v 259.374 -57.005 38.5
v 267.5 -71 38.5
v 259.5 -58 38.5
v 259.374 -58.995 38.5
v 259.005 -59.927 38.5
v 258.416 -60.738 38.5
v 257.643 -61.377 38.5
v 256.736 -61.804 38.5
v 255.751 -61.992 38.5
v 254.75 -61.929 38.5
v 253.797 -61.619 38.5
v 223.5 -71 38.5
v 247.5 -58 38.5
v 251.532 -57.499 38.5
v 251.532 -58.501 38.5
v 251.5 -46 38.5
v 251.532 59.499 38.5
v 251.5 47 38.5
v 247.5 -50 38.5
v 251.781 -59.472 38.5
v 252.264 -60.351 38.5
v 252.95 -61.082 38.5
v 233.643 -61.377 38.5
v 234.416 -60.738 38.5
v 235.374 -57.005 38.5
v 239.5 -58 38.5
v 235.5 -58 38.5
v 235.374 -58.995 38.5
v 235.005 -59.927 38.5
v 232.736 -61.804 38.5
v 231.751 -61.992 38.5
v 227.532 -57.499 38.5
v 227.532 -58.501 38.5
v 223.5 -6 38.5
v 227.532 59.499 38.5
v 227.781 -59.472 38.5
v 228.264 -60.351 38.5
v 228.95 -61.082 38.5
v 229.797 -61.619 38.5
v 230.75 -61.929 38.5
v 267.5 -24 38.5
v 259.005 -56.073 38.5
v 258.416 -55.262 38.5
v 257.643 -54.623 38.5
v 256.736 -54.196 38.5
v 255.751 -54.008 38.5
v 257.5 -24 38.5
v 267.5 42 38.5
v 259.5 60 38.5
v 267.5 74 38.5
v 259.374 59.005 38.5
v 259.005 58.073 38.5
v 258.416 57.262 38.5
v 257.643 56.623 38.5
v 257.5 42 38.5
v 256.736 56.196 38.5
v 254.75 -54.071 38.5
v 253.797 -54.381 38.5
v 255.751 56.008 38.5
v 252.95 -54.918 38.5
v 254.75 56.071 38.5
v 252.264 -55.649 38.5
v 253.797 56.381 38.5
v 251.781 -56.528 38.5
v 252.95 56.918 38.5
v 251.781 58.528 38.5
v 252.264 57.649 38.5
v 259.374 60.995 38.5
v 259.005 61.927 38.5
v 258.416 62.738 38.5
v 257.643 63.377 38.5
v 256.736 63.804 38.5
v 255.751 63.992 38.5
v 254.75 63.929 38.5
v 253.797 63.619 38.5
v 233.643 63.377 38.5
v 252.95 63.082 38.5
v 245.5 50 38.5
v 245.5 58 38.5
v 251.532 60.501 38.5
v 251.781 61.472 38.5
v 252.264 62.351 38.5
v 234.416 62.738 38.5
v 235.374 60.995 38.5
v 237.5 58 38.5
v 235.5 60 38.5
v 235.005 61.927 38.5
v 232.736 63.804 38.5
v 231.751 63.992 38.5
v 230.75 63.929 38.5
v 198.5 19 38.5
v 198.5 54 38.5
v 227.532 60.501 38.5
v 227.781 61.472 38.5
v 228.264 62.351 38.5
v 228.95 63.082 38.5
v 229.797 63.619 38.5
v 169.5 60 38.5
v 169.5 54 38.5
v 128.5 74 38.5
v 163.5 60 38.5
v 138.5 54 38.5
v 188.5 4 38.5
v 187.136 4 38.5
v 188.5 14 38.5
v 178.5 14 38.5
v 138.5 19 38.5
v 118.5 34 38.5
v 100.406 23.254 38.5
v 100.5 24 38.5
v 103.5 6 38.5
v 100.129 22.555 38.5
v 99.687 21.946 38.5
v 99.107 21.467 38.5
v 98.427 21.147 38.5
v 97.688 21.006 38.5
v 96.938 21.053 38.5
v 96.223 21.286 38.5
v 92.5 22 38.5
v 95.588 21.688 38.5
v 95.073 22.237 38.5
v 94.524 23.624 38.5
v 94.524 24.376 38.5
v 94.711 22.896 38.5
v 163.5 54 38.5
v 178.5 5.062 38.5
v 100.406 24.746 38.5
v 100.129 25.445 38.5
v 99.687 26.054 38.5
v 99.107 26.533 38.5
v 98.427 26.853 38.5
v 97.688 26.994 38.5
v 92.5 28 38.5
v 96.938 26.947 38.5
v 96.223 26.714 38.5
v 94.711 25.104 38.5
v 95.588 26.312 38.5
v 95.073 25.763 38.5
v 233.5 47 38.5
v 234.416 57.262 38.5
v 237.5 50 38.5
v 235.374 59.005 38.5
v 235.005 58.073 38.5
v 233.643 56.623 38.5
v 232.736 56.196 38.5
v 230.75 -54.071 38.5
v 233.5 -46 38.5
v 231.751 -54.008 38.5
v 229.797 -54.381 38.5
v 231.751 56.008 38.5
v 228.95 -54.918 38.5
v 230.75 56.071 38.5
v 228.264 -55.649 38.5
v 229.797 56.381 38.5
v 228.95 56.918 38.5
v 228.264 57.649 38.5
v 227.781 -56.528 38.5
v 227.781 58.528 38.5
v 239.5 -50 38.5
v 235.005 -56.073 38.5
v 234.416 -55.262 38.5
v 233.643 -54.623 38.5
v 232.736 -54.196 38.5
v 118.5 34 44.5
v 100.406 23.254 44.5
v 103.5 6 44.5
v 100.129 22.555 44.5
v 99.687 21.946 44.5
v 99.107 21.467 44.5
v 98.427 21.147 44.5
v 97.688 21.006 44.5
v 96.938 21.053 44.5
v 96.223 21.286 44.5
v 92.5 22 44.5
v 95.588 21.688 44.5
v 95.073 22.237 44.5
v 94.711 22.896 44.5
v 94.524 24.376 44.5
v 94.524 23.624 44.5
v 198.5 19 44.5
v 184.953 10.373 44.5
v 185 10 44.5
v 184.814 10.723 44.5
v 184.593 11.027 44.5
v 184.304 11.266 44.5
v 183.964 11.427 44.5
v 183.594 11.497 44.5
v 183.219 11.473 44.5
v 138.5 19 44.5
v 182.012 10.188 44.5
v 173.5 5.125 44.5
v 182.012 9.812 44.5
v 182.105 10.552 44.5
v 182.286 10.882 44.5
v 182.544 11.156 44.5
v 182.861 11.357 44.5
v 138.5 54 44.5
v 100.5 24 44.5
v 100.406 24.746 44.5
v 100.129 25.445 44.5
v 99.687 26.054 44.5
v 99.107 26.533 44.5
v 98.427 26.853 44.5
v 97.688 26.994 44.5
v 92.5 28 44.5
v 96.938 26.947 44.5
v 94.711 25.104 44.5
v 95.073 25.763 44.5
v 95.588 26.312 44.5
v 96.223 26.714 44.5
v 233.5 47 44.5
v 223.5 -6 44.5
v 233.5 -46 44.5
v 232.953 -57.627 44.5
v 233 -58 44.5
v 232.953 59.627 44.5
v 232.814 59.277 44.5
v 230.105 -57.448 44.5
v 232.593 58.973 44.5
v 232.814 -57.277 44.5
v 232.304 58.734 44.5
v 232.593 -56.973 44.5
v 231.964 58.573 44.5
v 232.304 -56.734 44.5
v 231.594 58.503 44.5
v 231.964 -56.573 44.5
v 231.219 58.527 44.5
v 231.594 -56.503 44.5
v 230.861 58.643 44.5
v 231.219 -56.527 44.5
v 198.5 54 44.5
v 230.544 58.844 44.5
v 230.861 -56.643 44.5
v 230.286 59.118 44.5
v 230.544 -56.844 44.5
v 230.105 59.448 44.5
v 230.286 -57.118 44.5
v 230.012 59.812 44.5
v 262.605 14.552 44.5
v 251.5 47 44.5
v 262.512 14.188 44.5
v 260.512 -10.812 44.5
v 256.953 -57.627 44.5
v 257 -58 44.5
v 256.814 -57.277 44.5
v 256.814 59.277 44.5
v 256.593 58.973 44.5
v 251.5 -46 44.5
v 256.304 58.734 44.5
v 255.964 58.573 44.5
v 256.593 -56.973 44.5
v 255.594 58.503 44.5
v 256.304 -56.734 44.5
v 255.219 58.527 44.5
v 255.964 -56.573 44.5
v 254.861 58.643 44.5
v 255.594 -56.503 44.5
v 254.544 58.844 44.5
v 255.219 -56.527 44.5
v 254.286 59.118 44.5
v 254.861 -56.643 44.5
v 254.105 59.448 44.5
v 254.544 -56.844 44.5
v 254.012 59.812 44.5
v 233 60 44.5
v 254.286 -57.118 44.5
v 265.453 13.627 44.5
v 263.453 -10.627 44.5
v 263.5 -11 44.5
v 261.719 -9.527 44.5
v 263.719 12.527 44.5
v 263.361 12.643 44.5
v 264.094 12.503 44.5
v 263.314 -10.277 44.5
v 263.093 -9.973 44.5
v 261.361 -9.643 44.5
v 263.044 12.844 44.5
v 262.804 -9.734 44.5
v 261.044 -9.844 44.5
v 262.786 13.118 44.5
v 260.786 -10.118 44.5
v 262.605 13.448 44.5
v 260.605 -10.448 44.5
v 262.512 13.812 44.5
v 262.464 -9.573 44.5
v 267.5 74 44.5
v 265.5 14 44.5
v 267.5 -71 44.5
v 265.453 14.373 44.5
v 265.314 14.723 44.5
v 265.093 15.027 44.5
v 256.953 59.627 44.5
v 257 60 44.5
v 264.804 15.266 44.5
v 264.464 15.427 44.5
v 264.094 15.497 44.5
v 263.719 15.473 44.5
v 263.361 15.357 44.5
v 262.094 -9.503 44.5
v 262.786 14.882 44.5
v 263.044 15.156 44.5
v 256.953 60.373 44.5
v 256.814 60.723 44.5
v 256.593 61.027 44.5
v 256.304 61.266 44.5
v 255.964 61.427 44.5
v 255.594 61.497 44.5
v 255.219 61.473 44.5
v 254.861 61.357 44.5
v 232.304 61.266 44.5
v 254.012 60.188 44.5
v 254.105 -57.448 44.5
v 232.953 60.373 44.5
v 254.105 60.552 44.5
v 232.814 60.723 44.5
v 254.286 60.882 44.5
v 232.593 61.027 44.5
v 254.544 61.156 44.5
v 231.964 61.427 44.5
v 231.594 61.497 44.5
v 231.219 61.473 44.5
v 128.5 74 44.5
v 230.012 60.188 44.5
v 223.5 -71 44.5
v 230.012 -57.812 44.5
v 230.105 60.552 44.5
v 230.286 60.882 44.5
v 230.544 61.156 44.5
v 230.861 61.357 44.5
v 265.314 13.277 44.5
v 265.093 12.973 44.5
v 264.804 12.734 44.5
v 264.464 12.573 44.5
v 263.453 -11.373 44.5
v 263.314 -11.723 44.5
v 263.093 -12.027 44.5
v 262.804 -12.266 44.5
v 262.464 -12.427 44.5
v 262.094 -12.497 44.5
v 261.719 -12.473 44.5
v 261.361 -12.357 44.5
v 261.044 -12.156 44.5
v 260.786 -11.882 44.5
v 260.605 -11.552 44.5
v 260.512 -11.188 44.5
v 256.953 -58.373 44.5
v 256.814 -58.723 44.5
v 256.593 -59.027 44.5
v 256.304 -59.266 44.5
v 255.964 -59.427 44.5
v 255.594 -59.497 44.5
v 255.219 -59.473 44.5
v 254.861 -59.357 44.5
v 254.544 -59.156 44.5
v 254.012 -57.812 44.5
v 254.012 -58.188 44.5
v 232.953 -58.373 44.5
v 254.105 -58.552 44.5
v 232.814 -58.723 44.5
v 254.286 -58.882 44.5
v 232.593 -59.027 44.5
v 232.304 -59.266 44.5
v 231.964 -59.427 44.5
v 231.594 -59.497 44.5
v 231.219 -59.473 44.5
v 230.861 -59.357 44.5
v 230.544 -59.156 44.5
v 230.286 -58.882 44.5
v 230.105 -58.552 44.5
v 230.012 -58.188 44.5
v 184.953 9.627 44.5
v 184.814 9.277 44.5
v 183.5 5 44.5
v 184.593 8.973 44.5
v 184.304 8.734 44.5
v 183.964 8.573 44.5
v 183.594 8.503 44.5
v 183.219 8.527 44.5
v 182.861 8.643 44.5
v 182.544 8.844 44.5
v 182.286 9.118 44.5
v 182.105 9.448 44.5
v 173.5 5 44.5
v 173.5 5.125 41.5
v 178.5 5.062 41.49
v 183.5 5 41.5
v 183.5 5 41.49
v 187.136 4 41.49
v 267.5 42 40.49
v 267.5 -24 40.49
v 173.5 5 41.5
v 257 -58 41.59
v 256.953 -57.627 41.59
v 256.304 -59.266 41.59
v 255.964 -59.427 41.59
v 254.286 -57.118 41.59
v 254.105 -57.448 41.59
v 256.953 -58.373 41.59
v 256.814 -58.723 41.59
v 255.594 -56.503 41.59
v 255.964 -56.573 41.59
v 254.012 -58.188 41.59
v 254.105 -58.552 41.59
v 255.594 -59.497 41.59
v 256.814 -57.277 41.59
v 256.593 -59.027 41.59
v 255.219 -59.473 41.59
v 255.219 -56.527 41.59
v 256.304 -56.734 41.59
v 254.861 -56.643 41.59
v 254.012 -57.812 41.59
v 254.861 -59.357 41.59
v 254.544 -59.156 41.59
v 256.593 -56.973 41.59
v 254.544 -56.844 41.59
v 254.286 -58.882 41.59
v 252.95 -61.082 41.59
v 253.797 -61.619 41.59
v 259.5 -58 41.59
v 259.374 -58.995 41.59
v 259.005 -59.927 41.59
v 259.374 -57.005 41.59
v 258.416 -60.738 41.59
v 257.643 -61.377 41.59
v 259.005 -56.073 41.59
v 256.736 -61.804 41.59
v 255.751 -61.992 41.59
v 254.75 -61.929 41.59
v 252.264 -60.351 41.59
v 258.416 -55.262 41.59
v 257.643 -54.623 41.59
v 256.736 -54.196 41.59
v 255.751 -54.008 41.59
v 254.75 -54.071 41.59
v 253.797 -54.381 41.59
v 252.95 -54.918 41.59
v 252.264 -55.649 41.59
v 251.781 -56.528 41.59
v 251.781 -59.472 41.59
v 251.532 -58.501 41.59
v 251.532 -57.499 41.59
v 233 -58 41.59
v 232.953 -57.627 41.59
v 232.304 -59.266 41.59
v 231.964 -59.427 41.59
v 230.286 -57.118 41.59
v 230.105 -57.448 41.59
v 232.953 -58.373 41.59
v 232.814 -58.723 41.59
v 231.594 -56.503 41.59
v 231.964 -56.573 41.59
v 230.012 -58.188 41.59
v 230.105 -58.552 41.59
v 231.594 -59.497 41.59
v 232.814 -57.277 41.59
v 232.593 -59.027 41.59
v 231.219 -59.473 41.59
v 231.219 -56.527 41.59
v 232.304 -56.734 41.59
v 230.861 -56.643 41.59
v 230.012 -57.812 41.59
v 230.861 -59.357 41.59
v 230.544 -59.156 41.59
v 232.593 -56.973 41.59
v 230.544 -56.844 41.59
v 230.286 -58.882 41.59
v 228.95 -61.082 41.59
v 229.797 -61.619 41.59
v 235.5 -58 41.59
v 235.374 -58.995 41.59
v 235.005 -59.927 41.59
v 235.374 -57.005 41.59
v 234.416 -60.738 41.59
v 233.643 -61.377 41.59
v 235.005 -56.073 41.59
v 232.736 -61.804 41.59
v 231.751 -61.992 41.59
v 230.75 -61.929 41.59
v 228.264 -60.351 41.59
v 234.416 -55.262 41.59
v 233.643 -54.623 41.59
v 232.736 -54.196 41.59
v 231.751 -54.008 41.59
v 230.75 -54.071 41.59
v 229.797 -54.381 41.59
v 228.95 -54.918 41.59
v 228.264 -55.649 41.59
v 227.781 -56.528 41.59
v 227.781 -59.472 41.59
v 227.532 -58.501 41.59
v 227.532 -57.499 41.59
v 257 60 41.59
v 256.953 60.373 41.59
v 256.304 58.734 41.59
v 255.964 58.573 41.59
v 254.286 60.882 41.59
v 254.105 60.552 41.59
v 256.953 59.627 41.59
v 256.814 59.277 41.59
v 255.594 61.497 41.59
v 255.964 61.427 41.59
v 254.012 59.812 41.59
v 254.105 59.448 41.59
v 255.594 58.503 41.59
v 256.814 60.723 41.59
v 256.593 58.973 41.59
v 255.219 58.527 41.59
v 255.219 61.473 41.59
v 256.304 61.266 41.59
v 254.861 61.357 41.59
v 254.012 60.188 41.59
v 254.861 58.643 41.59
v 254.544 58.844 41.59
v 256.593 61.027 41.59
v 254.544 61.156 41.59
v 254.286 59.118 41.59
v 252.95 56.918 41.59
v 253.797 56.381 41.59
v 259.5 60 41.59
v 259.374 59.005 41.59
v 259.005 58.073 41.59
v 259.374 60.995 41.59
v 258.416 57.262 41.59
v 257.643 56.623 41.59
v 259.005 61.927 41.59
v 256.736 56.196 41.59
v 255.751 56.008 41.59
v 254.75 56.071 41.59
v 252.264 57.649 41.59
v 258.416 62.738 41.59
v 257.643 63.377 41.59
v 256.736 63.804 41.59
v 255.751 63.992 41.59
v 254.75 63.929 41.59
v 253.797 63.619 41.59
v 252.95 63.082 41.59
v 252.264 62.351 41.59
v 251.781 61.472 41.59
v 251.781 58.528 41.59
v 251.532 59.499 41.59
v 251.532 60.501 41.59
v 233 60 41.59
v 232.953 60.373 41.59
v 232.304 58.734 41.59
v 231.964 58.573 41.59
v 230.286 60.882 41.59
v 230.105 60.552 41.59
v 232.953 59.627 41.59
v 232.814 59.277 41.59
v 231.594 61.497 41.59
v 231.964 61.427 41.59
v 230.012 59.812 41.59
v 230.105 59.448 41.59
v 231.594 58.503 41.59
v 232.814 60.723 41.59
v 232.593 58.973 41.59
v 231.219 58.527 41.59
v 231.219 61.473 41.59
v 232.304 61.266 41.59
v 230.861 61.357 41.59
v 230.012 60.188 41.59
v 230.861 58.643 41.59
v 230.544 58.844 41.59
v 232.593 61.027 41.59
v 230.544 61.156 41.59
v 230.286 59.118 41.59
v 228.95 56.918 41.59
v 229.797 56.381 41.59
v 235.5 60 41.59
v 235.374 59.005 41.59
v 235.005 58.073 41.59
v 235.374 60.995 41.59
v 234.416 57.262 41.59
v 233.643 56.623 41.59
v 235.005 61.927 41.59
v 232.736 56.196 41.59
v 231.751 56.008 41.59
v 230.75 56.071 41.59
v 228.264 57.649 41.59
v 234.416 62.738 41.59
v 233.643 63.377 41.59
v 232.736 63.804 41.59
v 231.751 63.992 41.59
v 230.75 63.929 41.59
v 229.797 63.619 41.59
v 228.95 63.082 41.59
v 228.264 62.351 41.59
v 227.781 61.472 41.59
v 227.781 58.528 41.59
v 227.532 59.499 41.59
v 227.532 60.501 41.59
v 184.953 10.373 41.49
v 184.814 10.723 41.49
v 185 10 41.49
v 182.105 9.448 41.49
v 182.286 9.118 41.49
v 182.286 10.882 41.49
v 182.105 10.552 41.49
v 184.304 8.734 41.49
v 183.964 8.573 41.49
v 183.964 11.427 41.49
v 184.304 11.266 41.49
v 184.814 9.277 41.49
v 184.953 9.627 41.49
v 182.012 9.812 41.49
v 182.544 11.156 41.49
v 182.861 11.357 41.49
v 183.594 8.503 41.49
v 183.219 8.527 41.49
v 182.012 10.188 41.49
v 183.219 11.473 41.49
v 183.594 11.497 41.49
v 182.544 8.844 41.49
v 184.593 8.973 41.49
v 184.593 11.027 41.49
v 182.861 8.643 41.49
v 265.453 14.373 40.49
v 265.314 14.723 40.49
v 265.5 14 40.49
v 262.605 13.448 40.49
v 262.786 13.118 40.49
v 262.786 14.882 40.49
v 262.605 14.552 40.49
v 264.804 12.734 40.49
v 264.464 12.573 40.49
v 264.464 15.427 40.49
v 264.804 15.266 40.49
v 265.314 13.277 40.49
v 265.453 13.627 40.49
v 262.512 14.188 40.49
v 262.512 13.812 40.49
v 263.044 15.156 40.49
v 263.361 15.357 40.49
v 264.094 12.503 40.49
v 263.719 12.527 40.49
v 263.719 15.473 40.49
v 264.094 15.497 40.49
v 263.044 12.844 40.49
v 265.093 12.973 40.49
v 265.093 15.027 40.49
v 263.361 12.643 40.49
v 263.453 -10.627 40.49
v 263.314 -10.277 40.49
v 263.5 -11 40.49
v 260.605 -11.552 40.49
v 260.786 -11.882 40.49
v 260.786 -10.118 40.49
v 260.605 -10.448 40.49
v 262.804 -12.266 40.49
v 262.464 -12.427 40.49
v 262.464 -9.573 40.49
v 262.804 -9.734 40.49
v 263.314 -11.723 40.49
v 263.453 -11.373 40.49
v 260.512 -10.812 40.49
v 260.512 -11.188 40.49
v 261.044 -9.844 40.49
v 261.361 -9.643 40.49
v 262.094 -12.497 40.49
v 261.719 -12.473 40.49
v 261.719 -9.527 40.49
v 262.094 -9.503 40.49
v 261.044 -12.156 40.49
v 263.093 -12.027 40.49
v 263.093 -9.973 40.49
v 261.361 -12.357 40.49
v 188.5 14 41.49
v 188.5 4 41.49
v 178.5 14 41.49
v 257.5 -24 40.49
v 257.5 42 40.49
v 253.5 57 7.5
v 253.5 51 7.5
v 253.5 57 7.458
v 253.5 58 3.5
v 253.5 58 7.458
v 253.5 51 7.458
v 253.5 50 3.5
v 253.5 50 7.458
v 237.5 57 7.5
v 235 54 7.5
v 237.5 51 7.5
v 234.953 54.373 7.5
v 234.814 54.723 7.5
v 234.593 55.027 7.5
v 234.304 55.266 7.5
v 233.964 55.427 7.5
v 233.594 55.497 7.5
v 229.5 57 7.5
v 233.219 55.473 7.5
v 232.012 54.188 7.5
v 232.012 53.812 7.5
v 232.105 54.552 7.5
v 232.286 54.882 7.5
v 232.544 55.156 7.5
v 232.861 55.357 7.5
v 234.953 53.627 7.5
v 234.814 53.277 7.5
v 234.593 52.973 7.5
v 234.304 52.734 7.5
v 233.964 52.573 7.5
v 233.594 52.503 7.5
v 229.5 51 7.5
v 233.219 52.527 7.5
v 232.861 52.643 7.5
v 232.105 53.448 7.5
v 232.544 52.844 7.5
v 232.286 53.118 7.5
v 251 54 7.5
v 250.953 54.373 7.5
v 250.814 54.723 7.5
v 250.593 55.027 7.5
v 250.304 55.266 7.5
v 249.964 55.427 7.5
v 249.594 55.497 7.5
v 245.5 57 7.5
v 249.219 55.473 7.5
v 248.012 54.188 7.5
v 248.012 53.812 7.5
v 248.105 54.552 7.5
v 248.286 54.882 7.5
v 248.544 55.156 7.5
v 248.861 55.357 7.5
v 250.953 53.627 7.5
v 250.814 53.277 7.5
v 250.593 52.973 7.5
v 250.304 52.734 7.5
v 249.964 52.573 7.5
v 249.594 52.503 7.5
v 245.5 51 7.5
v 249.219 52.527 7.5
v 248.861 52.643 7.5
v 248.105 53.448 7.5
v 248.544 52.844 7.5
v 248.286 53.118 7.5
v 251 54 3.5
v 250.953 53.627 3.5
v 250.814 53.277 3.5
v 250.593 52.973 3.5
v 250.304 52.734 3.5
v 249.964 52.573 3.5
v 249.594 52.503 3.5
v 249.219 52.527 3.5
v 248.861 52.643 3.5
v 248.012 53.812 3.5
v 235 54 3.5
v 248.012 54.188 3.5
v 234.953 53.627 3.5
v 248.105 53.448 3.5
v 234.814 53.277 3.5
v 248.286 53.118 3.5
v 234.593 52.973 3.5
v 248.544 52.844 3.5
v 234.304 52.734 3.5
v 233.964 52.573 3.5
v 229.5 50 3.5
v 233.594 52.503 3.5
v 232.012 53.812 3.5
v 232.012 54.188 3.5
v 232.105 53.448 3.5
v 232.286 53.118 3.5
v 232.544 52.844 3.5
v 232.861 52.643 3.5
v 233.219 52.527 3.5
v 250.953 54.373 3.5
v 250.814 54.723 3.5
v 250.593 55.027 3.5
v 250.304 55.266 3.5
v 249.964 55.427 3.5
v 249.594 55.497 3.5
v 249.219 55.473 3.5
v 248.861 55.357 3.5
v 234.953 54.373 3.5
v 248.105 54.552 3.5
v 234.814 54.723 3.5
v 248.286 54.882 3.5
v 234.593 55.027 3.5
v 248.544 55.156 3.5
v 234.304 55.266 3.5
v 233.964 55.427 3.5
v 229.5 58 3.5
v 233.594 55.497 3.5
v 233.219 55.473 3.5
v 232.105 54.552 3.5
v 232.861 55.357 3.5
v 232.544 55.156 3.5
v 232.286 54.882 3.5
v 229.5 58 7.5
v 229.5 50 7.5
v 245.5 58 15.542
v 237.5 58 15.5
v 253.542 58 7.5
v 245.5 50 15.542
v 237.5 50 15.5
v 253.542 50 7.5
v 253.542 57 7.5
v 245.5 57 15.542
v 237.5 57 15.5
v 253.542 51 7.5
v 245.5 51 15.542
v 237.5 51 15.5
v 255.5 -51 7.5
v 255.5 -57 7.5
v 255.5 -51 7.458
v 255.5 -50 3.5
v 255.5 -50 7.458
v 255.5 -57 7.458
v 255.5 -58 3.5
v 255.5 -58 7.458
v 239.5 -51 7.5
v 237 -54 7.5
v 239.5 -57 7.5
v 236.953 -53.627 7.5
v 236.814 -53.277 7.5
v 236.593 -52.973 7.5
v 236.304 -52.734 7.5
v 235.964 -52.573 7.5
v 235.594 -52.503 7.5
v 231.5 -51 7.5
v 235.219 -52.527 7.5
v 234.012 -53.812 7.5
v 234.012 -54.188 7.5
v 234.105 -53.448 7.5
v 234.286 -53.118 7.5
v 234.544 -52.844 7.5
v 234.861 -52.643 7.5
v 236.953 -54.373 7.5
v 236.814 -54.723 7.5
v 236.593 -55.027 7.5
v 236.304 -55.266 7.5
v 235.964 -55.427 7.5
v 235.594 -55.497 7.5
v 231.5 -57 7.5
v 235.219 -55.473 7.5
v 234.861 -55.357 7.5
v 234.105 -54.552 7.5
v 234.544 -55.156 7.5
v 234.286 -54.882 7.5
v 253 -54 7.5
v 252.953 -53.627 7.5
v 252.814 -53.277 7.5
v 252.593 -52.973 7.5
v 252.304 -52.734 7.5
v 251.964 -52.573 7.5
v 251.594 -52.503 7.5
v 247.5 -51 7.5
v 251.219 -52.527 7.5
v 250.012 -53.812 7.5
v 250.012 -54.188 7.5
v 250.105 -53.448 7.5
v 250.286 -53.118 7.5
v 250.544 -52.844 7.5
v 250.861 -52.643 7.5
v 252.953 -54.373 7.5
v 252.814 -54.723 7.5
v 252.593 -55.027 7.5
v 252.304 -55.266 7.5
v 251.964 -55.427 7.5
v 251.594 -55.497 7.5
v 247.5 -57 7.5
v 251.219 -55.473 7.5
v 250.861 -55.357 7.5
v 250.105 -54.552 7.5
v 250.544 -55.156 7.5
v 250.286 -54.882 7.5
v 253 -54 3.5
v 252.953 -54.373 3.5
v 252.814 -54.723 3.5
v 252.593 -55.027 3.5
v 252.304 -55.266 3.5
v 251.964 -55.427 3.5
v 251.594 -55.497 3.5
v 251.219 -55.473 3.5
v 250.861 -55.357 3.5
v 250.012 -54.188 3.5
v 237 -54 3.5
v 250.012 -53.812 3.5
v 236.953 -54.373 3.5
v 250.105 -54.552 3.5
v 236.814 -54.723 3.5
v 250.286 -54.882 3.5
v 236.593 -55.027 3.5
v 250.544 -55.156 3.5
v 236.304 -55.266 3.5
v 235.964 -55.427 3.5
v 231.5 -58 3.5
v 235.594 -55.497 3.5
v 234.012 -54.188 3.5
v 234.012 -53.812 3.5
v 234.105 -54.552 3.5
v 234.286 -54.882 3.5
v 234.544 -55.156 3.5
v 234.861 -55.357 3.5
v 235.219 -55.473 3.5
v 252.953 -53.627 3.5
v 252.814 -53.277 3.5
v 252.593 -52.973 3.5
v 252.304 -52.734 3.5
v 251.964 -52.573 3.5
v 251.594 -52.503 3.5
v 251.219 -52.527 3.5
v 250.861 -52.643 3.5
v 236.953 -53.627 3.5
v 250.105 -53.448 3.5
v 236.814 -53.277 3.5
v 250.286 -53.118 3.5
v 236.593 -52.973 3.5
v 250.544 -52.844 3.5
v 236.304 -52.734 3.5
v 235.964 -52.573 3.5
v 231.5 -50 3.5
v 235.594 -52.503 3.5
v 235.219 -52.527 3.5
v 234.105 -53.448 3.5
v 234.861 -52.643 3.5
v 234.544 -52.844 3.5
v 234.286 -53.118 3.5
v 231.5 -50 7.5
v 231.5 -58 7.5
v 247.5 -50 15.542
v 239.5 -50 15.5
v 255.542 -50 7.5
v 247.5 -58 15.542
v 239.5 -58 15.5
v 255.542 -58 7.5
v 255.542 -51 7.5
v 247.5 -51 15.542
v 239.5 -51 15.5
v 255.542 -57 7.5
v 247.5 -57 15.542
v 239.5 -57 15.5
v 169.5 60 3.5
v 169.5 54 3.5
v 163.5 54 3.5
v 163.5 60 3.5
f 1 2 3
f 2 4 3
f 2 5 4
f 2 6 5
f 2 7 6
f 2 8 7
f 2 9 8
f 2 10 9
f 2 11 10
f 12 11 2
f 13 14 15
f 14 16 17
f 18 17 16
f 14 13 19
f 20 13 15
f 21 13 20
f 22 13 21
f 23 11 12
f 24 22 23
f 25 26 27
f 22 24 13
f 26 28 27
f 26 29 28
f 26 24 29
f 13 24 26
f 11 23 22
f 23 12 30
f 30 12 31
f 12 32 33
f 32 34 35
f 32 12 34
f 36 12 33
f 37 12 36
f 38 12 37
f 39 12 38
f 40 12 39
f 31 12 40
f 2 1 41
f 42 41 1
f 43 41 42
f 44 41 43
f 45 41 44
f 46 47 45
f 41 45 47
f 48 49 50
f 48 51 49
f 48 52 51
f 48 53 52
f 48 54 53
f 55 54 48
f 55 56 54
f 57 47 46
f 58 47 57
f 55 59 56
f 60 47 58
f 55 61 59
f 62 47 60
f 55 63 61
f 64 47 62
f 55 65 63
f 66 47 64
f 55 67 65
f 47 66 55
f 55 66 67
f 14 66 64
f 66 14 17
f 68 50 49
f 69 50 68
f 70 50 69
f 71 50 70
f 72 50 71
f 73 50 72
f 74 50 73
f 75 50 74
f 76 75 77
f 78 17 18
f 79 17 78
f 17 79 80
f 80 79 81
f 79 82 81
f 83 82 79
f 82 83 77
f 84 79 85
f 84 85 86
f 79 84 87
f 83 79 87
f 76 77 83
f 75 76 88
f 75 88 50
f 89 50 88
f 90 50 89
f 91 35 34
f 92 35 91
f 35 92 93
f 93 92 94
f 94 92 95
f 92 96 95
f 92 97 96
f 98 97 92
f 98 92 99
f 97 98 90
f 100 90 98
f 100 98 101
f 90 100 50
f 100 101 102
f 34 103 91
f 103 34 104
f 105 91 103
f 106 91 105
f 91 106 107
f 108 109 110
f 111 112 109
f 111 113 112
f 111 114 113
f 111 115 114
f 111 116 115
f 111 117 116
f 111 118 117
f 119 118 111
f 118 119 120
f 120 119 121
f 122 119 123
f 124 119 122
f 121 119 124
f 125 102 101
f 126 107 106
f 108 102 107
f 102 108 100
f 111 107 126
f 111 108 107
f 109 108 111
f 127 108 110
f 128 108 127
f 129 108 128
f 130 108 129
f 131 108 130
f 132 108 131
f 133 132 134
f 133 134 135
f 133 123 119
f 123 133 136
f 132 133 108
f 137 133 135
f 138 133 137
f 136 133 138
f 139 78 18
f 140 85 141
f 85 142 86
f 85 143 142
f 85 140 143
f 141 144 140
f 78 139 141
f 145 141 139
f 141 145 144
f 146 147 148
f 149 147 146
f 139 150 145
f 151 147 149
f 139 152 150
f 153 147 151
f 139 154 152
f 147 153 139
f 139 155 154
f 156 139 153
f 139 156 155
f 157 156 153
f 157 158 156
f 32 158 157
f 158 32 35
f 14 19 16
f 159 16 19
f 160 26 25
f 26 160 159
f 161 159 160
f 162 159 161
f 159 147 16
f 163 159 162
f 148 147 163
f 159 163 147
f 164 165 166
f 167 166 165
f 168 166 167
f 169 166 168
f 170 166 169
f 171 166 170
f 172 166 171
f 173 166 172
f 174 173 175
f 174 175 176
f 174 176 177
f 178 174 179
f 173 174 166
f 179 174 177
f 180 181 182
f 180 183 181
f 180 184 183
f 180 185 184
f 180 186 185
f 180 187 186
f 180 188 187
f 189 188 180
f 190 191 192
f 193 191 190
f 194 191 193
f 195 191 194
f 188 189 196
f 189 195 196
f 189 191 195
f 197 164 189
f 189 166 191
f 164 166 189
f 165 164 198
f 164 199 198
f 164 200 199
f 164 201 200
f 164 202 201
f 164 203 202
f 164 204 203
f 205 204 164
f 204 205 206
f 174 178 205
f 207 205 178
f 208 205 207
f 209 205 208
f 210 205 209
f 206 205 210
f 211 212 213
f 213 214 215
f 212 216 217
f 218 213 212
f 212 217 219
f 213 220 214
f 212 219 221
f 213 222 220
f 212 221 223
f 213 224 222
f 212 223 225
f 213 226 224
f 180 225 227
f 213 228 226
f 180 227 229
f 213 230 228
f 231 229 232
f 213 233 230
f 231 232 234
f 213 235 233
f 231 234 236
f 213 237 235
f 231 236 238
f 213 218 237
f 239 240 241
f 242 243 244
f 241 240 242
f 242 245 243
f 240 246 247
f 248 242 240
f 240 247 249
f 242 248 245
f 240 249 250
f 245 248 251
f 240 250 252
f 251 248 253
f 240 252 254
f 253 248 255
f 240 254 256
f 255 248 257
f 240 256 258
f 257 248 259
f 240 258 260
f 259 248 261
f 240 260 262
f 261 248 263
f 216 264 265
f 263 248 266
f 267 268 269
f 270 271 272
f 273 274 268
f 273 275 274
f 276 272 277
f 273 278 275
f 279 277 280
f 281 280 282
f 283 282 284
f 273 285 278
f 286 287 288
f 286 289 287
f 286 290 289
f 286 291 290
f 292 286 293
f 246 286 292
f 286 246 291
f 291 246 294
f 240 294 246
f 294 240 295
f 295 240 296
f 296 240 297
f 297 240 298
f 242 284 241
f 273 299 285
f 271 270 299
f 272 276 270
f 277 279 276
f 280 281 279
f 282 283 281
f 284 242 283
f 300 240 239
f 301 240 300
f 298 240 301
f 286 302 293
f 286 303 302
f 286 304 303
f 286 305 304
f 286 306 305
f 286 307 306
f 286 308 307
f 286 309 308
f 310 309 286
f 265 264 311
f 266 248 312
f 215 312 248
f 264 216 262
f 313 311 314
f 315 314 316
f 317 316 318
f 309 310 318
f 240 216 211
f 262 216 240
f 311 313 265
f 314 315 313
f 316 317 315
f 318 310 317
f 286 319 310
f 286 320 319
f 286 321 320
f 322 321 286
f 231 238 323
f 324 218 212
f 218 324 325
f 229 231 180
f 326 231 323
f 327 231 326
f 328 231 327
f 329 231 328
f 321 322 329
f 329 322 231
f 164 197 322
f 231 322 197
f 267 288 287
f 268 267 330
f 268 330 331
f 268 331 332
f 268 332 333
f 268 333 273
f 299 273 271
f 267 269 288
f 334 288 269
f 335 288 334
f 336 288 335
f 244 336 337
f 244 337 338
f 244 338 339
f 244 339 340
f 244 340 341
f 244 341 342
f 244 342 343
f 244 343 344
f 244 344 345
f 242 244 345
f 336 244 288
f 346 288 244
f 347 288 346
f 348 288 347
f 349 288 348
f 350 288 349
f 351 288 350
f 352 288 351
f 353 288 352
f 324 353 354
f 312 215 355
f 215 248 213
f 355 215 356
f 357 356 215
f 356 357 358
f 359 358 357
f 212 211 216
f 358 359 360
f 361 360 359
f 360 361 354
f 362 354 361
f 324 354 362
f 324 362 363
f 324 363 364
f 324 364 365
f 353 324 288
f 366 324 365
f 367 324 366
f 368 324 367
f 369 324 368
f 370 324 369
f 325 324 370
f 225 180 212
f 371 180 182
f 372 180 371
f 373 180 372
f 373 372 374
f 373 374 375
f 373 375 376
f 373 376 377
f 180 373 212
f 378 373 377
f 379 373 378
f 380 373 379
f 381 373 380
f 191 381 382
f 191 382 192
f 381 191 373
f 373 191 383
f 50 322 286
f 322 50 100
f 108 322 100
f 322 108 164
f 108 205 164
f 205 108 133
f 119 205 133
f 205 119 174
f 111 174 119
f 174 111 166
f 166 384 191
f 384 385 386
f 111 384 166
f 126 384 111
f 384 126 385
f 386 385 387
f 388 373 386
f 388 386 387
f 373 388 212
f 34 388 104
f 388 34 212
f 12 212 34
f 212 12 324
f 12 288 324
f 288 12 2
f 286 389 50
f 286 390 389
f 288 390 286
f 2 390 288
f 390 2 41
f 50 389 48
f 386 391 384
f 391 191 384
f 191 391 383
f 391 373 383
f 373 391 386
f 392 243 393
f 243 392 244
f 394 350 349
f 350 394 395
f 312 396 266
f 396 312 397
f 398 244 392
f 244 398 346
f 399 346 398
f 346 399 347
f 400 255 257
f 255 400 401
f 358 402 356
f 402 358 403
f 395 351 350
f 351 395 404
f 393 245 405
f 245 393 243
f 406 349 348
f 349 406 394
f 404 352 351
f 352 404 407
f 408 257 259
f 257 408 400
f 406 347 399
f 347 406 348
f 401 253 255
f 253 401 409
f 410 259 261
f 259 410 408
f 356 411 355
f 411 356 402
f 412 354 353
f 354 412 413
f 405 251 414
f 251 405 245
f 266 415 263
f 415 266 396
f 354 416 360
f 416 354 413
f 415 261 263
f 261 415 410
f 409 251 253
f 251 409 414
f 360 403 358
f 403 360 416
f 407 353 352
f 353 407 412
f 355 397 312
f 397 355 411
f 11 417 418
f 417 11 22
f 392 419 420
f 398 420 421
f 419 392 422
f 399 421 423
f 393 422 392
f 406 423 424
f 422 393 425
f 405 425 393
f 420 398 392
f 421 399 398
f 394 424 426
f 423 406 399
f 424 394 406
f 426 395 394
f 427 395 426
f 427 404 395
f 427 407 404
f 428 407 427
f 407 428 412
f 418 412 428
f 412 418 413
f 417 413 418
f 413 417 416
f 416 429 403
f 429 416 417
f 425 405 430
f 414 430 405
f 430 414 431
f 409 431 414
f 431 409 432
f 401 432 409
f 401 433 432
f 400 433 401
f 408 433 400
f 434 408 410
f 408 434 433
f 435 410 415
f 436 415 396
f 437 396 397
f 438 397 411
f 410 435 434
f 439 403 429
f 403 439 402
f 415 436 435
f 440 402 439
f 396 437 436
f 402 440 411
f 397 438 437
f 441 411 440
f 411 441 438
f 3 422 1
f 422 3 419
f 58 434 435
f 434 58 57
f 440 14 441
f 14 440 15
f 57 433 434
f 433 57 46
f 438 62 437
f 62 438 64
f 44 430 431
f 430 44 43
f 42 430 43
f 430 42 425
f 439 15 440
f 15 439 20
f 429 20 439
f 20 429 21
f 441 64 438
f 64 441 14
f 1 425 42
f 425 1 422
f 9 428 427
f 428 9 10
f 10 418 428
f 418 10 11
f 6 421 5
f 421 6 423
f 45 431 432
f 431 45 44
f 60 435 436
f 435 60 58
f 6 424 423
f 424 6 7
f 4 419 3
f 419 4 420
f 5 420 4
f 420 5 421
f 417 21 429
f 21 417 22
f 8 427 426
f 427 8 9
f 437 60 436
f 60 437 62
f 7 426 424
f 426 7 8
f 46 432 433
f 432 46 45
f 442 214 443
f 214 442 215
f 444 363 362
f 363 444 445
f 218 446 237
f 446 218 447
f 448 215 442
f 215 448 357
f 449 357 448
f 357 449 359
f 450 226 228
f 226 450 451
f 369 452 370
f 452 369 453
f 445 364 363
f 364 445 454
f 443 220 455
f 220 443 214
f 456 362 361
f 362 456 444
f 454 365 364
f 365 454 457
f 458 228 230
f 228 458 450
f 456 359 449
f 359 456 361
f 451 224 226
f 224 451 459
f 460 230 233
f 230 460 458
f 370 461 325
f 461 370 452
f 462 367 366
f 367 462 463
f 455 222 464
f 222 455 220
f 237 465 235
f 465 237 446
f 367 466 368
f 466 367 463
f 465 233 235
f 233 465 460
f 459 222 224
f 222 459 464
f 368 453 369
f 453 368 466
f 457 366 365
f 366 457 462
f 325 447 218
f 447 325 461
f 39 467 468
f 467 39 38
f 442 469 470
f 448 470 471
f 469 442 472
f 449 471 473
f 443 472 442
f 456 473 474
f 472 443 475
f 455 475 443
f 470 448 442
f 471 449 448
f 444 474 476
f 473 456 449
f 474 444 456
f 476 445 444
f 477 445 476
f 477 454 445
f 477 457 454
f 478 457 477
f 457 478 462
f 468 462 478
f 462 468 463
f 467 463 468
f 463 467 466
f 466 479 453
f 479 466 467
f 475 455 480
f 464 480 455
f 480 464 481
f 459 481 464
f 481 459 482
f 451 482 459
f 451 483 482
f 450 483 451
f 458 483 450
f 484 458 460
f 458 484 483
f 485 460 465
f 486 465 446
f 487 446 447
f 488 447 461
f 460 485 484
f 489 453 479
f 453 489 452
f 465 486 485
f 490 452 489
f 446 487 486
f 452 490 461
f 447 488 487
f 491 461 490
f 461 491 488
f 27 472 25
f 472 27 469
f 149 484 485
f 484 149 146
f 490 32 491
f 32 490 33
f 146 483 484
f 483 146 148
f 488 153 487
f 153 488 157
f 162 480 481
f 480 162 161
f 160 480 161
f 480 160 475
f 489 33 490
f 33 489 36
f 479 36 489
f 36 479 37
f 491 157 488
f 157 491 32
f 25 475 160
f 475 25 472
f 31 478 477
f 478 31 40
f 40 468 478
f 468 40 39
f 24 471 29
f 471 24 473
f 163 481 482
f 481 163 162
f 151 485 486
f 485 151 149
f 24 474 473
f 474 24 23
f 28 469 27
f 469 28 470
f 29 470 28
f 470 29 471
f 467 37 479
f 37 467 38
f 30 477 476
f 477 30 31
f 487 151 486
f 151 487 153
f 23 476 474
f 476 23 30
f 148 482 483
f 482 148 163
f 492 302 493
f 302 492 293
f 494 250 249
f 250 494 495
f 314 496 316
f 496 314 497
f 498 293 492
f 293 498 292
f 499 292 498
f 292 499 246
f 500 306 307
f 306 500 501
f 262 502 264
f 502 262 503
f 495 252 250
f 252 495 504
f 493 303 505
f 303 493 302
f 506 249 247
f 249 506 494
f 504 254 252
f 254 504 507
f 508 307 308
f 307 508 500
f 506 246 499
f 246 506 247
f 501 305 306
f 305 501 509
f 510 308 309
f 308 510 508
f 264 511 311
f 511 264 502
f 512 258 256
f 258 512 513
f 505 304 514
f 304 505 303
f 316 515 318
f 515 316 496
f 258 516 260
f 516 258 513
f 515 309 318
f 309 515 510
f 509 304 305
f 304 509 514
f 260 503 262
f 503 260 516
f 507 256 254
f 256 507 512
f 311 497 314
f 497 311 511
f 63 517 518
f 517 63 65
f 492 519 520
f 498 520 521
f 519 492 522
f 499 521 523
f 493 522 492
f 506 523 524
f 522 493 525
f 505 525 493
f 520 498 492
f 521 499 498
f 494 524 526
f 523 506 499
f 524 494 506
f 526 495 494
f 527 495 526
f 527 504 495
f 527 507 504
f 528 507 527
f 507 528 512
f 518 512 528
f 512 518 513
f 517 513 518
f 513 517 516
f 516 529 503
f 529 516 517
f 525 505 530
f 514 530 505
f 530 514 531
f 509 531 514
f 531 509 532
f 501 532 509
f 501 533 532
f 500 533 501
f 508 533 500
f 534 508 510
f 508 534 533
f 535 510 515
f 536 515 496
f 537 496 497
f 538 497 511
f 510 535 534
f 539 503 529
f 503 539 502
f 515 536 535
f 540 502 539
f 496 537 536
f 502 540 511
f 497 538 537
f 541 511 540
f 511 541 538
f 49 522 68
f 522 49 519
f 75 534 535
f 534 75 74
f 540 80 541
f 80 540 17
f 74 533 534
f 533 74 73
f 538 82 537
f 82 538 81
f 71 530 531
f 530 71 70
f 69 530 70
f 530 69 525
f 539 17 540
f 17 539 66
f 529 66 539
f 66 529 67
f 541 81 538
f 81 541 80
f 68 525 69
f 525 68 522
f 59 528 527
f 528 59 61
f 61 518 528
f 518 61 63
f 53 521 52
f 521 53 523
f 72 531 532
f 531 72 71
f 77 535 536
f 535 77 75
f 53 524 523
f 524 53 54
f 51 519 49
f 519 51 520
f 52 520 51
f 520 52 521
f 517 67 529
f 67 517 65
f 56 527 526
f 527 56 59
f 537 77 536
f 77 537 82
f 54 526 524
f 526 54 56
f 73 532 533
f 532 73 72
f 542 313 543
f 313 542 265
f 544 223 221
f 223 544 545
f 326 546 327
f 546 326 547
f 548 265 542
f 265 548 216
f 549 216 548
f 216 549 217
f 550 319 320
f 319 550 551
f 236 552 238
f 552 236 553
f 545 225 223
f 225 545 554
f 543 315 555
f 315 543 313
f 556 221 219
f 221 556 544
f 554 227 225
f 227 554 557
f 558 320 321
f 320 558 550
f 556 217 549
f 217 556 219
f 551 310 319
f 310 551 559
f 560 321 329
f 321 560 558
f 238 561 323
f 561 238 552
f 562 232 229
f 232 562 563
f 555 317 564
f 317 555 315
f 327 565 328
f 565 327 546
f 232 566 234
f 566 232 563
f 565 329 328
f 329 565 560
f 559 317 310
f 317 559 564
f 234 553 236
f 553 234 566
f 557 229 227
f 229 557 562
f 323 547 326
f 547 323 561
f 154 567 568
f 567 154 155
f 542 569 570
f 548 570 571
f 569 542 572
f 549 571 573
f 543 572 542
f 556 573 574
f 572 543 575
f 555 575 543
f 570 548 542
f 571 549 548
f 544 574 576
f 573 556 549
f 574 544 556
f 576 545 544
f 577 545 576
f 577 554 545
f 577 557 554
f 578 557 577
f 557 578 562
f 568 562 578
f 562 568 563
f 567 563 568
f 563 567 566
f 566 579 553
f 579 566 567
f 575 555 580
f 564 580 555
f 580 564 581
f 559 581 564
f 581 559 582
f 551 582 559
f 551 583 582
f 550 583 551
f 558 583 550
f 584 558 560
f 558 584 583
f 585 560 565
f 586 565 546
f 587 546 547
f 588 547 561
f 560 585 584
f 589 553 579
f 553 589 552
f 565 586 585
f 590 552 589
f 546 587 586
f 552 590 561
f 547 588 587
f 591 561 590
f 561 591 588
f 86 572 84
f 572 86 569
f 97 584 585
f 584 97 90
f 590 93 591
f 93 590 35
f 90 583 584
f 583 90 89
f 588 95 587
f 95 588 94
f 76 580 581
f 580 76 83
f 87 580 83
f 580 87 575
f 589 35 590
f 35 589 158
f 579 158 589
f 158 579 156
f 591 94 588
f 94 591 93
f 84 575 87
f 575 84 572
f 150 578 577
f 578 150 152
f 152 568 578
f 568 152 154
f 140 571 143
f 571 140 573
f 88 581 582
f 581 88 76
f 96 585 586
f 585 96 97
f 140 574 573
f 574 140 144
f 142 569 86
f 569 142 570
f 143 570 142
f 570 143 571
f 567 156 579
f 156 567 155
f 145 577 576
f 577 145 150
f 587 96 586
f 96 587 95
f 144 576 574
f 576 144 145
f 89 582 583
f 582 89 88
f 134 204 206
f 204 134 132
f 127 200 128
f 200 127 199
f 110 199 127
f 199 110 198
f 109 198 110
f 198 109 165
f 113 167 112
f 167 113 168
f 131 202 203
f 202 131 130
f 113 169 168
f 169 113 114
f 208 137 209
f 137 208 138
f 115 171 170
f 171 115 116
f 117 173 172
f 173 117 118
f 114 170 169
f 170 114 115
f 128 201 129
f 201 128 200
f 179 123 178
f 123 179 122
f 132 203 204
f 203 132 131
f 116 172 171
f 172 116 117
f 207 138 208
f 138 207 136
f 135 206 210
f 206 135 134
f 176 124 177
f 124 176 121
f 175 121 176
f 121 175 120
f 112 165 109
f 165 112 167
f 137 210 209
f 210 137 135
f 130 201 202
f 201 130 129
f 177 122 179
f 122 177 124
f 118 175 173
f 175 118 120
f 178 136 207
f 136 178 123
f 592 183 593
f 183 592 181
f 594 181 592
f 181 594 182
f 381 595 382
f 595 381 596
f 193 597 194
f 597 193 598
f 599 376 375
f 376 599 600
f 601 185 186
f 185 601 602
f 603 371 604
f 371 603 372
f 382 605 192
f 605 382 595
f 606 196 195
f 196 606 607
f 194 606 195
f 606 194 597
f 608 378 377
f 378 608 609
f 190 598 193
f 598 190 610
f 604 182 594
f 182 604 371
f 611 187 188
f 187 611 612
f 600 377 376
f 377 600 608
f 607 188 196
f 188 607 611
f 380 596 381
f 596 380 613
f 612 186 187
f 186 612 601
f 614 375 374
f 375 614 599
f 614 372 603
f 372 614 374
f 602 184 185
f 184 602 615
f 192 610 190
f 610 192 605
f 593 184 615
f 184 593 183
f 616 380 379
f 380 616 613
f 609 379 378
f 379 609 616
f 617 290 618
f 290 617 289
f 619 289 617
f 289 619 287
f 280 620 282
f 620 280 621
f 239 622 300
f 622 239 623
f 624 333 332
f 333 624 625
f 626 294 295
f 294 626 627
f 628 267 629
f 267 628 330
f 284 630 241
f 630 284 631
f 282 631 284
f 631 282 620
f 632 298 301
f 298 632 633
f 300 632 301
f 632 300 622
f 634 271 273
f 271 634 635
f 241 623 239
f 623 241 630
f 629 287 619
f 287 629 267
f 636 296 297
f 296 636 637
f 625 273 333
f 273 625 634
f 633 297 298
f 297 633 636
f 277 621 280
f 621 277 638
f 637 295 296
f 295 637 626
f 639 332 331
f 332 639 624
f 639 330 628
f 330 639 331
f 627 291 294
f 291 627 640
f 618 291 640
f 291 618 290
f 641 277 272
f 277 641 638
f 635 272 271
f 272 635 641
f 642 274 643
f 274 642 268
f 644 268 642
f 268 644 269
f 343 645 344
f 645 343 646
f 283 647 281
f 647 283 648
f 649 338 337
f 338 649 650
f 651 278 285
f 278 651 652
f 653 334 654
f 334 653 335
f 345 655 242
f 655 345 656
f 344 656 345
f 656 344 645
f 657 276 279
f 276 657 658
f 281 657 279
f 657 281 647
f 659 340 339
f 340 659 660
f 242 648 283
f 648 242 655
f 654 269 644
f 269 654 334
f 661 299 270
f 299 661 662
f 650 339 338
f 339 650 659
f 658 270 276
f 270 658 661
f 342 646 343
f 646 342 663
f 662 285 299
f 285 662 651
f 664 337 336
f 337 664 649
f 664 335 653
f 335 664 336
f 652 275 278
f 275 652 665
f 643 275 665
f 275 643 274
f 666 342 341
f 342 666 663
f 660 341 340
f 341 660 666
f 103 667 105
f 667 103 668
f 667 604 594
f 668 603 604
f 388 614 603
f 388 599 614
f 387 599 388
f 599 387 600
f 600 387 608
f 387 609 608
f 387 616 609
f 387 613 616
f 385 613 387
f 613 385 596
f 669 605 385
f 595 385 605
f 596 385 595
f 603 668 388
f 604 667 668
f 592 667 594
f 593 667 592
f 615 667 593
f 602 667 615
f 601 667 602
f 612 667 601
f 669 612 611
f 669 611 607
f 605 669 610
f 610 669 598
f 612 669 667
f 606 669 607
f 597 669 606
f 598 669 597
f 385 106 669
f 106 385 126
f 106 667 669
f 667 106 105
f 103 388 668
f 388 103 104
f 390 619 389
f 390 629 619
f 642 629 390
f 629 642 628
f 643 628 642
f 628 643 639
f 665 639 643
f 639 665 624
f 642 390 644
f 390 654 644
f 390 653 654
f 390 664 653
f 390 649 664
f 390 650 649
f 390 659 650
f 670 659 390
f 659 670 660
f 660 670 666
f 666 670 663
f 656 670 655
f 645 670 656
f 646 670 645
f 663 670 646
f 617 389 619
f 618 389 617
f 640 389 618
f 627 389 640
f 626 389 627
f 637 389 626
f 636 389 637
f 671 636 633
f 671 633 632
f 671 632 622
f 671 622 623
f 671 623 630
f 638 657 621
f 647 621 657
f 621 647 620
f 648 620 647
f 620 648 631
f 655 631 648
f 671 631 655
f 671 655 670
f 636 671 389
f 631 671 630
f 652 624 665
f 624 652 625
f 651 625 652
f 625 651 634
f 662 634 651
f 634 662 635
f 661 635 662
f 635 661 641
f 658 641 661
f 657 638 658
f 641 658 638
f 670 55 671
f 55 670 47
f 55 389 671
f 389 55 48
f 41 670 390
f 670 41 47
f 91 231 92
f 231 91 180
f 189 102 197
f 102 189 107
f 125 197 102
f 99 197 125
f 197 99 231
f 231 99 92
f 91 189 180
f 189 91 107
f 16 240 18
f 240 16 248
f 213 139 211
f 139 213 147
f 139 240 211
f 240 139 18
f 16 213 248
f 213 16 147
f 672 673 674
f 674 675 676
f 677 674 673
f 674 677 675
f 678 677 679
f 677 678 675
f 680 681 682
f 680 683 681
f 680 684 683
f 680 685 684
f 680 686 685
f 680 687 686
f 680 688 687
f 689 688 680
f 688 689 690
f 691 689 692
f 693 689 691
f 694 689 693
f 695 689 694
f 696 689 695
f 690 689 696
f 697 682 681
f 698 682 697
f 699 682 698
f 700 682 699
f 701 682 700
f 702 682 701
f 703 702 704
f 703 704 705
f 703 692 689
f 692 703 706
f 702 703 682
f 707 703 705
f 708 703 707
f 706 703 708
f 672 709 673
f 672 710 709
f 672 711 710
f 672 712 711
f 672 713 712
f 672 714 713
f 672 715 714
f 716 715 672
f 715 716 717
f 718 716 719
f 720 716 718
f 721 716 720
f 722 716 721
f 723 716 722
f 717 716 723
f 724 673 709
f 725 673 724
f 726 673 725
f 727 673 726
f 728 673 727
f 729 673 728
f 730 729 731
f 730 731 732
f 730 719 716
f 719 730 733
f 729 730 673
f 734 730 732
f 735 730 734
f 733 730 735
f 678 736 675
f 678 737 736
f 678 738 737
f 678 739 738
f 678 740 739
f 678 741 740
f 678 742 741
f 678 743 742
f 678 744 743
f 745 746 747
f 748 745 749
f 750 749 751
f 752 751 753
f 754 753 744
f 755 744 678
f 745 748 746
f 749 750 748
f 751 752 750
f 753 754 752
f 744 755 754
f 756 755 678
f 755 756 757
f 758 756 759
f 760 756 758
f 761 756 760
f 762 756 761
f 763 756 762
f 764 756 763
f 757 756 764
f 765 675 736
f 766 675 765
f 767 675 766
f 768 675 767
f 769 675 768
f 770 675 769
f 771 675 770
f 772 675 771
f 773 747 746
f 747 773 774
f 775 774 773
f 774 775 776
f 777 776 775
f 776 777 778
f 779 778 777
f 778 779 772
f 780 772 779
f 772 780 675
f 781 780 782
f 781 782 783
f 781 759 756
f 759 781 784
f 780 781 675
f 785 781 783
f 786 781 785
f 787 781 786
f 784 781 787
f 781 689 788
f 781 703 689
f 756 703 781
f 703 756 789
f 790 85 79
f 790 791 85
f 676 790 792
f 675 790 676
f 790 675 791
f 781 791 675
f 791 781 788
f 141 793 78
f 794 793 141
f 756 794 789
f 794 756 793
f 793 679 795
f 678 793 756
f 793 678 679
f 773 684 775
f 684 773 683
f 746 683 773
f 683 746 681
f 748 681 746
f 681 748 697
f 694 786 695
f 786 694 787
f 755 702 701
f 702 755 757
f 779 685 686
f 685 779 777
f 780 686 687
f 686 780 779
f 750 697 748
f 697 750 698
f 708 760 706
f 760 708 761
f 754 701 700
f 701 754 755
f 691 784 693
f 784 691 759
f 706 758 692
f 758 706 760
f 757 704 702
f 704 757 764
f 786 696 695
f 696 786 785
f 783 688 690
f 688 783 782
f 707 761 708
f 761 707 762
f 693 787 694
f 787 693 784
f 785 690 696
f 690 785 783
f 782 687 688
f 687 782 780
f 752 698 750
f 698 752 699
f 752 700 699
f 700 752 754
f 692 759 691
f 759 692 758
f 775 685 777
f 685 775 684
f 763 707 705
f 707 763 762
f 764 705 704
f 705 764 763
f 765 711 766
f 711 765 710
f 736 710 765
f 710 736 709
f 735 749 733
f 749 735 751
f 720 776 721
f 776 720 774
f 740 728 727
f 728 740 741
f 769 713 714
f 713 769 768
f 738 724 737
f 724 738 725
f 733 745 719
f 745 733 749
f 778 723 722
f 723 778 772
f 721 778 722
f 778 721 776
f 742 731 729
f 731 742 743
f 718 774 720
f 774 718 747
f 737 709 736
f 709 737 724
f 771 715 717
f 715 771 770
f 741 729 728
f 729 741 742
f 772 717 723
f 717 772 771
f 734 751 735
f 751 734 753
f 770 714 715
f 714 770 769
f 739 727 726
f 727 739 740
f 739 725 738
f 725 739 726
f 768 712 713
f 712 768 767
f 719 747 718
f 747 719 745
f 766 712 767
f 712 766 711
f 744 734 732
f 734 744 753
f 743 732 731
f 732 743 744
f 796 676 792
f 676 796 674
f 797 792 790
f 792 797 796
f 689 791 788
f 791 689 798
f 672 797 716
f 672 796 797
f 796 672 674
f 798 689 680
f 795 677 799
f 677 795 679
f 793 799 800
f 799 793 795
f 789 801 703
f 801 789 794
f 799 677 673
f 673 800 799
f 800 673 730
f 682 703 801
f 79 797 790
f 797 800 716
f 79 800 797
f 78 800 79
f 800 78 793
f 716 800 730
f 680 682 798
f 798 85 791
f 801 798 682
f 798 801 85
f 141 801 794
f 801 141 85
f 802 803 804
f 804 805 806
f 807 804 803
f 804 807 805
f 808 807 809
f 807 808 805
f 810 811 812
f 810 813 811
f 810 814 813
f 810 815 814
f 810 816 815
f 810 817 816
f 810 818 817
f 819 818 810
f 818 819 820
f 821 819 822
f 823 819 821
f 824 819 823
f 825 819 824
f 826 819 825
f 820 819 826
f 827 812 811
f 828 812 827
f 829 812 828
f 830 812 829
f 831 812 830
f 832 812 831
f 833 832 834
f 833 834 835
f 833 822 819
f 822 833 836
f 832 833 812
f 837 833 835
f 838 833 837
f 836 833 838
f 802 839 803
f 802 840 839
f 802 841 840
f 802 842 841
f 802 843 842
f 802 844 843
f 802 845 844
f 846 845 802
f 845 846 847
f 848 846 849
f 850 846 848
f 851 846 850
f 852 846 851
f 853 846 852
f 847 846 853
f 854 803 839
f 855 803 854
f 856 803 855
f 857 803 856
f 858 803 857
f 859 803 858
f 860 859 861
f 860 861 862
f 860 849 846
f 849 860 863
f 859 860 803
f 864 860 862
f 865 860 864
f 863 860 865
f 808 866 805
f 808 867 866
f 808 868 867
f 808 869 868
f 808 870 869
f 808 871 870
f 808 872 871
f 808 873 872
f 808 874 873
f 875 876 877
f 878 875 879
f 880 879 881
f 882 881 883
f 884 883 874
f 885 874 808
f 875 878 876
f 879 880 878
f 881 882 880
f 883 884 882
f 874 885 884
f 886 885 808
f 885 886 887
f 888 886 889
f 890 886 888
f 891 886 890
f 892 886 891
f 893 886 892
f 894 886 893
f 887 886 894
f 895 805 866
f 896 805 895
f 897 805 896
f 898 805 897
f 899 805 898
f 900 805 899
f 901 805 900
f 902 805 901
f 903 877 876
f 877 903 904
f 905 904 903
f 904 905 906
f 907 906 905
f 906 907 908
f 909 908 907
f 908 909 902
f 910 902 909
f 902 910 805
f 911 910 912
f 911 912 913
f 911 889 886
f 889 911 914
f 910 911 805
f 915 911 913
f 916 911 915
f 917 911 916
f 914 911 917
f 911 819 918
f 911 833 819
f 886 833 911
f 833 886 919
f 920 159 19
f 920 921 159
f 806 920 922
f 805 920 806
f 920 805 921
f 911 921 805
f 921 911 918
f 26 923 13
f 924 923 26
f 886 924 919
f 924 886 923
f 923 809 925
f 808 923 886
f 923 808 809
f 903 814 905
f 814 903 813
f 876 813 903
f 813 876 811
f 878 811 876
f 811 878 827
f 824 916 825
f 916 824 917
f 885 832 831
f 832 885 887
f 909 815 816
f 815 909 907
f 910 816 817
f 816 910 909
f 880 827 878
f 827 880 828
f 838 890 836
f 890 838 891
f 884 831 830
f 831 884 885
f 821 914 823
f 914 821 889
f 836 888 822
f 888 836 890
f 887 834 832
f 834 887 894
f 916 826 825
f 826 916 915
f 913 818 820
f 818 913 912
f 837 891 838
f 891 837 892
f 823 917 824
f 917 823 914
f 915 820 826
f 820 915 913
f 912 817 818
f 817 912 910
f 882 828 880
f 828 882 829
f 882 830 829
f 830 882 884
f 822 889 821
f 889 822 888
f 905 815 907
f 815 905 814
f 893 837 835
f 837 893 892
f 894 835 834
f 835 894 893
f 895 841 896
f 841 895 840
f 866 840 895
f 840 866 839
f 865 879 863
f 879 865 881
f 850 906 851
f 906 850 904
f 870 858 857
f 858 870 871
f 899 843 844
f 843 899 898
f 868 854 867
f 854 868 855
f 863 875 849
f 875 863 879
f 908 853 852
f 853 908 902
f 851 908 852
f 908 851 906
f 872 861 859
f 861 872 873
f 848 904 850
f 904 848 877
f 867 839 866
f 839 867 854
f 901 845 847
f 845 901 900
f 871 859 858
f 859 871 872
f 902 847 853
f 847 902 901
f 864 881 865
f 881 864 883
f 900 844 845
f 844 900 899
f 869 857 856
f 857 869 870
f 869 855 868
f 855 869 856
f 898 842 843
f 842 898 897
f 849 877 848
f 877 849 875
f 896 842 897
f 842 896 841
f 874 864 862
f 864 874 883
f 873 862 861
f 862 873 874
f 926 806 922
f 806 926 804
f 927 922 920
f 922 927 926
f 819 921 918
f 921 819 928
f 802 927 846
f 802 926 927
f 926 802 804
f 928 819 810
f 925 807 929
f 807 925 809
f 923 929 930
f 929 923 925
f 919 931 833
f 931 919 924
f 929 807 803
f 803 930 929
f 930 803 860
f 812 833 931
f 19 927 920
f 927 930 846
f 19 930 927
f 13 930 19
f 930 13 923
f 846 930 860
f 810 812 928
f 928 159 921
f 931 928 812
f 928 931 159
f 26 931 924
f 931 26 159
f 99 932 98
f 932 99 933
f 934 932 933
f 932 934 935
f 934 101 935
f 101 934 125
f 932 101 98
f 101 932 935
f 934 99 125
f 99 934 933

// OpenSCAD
$fn = 25;

round = 3;
thickness = 3.5;
vertexes = [
	[0 + round, 0],
	[7 + 0.6*round, 23.5 - 0.8*round],
	[65 + 0.6*round, 42 - 0.8*round],
	[95 - 0.6*round, 80 - 0.8*round],
	[251 - 0.6*round, 80 - 0.8*round],
	[280 - 0.6*round, 42 - 0.8*round],
	[326 - 0.6*round, 21 - 0.8*round],
	[336 - 0.8*round, 14 - 0.6*round],

	[336 - 0.8*round, -(14 - 0.6*round)],
	[326 - 0.6*round, -(21 - 0.8*round)],
	[280 - 0.6*round, -(42 - 0.8*round)],
	[251 - 0.6*round, -(80 - 0.8*round)],
	[95 - 0.6*round, -(80 - 0.8*round)],
	[65 + 0.6*round, -(42 - 0.8*round)],
	[7 + 0.6*round, -(23.5 - 0.8*round)],
];

module base() {
	linear_extrude(height = thickness) {
		minkowski() {
			polygon(points = vertexes);
			circle(r = round);
		}
	}
}

module rim() {
	linear_extrude(height = 4) {
		difference() {
			minkowski() {
				polygon(points = vertexes);
				circle(r = round);
			}
			minkowski() {
				polygon(points = vertexes);
				circle(r = round - 1);
			}
		}
	}
}

module screwHole() {
	translate([0, 0, -0.01]) cylinder(d = 6, h = 0.4*thickness);
	cylinder(d = 3, h = 1.01*thickness);
}

module invertScrewHole() {
	translate([0, 0, thickness+0.02]) mirror([0, 0, 1]) screwHole();
}

module hole(dia) {
	translate([0, 0, -0.01]) cylinder(d = dia, h = 1.01*10);
}

module podvozek() {
	// rims
	intersection() {
		union() {
			translate([0, 0, thickness]) rim();
			translate([50, -1, thickness]) cube([250, 2, 4]); // center stripe
		}
		translate([197, 0, -130]) rotate([0, -8, 0]) cube(300, center=true);
		translate([176, 0, -135]) rotate([0, 7, 0]) cube(300, center=true);
	}

	difference() {
		base();
		// front part
		translate([7, 0, 0]) screwHole();
		translate([14, 19, 0]) screwHole();
		translate([14, -19, 0]) screwHole();
		translate([40, 17, 0]) hole(5);
		translate([40, -17, 0]) hole(5);
		translate([48.5, 17, 0]) screwHole();
		translate([48.5, -17, 0]) screwHole();
		translate([59, 17, 0]) screwHole();
		translate([59, -17, 0]) screwHole();

		// middle part
		translate([96.5, 24, 0]) screwHole();
		translate([96.5, -24.5, 0]) screwHole();
		translate([105, 23, 0]) screwHole();
		translate([105.5, 31, 0]) hole(5);
		translate([154, 23.5, 0]) screwHole();
		translate([154, 31.5, 0]) hole(5);

		translate([184.5, 10.3, 0]) screwHole();
		translate([261, -12, 0]) screwHole();
		translate([262.5, 12, 0]) screwHole();
		translate([264, 35, 0]) screwHole();
		translate([269.5, 41, 0]) screwHole();

		// back part
		translate([331, 11, 0]) screwHole();
		translate([331, -11, 0]) screwHole();
		translate([316.5, 16.8, 0]) hole(5);
		translate([316.5, -16.8, 0]) hole(5);
		translate([309.5, 16.8, 0]) screwHole();
		translate([309.5, -16.8, 0]) screwHole();
		translate([298.5, 16.8, 0]) screwHole();
		translate([298.5, -16.8, 0]) screwHole();

		// for holder
		translate([137.5, 71, 0]) screwHole();
		translate([149.5, 71, 0]) screwHole();
		translate([227.5, 71, 0]) screwHole();
		translate([239.5, 71, 0]) screwHole();
		translate([237.5, -68, 0]) screwHole();
		translate([249.5, -68, 0]) screwHole();

		// connectors
		translate([160, 0, 0]) {
			translate([13, -60, -0.01]) invertScrewHole();
			translate([7, -40, -0.01]) invertScrewHole();
			translate([13, -20, -0.01]) invertScrewHole();
			translate([13, 20, -0.01]) invertScrewHole();
			translate([7, 40, -0.01]) invertScrewHole();
			translate([13, 60, -0.01]) invertScrewHole();
		}

		// for metal plate
		translate([15, 0, -0.01]) invertScrewHole();
		translate([325, 0, -0.01]) invertScrewHole();
	}

	// fuel cell holders
	translate([112, -80, thickness]) difference() {
		cube([2, 68, 8]);
		translate([0, 5, 4]) rotate([0, 90, 0]) hole(2);
		translate([0, 63.5, 4]) rotate([0, 90, 0]) hole(2);
	}
	translate([218, -80, thickness]) difference() {
		cube([2, 68, 8]);
		translate([0, 5, 4]) rotate([0, 90, 0]) hole(2);
		translate([0, 63.5, 4]) rotate([0, 90, 0]) hole(2);
	}
}

module diagonal() {
	difference() {
		rotate([0, 45, 0]) cube([17, 1, 17]);
		translate([0, -0.01, -26]) cube([25, 1.02, 25]);
	}
}

module leg() {
	difference() {
		translate([0, 0, 2]) cube([24, 8, 4], center=true);
		translate([-8, 0, 0]) hole(3);
		translate([8, 0, 0]) hole(3);
	}
	translate([-4, -4, 0]) cube([8, 8, 35]);
	translate([-12, 3, 4]) diagonal();
	translate([-12, -4, 4]) diagonal();
}

module thinHole() {
	hole(3);
	translate([0, 0, -0.01]) cylinder(d=8, h=3.1);
}

module holder() {
	holderThickness = 6;
	holderPoints = [
		[-1, -2], // screw 3
		[10, -18],
		[90, -19], // screw 2
		[130, -30],
		[130, -95],
		[174, -95],
		[174, -18], // screw 1a
		[174, 50],
		[35, 50],
		[25, 10],
		[-1, 4],
	];

	difference() {
		union() {
			linear_extrude(height = holderThickness) {
				polygon(points = holderPoints);
			}
			translate([80, -19, 3]) cube([20, 14, 3]);
			translate([160, -53, 2]) cube([14, 76, 3]);
		}
		translate([4, 0, 0]) hole(6); // 3
		translate([90, -14, 0]) hole(3); // 2
		translate([170.5, -10, 0]) hole(3); // 1a
		translate([168.5, -35, 0]) hole(3); // 1b
		translate([85, -20, -0.01]) cube([10, 10, 3]);
		translate([164, -48, -0.01]) cube([10, 66, 2]);

		translate([162, -82, 0]) thinHole();
		translate([138, -82, 0]) thinHole();
		translate([162, 36, 0]) thinHole();
		translate([138, 36, 0]) thinHole();

		translate([45, -5, -0.01]) cube([60, 35, 7]);
		translate([140, -70, -0.01]) cube([18, 93, 7]);
	}

	translate([70, 30, -35]) cube([6, 6, 35]);
	translate([148, 30, -35]) leg();
	translate([150, -78, -35]) leg();
}

module divider() {
	translate([-100, 0, 0]) cube([200, 200, 30], center=true);
	difference() {
		for (i = [-90 : 40 : 70]) {
			translate([0, i, 0]) rotate([0, -10, 0]) cube([20, 20, 10]);
			translate([0, i+20, thickness]) rotate([0, 10, 0]) translate([0, 0, -10]) cube([20, 20, 10]);
		}
	}
}

%intersection() {
	//podvozek();
	//translate([160, 0, 0]) divider();
}
translate([93.5, 24, 35+thickness]) holder();
